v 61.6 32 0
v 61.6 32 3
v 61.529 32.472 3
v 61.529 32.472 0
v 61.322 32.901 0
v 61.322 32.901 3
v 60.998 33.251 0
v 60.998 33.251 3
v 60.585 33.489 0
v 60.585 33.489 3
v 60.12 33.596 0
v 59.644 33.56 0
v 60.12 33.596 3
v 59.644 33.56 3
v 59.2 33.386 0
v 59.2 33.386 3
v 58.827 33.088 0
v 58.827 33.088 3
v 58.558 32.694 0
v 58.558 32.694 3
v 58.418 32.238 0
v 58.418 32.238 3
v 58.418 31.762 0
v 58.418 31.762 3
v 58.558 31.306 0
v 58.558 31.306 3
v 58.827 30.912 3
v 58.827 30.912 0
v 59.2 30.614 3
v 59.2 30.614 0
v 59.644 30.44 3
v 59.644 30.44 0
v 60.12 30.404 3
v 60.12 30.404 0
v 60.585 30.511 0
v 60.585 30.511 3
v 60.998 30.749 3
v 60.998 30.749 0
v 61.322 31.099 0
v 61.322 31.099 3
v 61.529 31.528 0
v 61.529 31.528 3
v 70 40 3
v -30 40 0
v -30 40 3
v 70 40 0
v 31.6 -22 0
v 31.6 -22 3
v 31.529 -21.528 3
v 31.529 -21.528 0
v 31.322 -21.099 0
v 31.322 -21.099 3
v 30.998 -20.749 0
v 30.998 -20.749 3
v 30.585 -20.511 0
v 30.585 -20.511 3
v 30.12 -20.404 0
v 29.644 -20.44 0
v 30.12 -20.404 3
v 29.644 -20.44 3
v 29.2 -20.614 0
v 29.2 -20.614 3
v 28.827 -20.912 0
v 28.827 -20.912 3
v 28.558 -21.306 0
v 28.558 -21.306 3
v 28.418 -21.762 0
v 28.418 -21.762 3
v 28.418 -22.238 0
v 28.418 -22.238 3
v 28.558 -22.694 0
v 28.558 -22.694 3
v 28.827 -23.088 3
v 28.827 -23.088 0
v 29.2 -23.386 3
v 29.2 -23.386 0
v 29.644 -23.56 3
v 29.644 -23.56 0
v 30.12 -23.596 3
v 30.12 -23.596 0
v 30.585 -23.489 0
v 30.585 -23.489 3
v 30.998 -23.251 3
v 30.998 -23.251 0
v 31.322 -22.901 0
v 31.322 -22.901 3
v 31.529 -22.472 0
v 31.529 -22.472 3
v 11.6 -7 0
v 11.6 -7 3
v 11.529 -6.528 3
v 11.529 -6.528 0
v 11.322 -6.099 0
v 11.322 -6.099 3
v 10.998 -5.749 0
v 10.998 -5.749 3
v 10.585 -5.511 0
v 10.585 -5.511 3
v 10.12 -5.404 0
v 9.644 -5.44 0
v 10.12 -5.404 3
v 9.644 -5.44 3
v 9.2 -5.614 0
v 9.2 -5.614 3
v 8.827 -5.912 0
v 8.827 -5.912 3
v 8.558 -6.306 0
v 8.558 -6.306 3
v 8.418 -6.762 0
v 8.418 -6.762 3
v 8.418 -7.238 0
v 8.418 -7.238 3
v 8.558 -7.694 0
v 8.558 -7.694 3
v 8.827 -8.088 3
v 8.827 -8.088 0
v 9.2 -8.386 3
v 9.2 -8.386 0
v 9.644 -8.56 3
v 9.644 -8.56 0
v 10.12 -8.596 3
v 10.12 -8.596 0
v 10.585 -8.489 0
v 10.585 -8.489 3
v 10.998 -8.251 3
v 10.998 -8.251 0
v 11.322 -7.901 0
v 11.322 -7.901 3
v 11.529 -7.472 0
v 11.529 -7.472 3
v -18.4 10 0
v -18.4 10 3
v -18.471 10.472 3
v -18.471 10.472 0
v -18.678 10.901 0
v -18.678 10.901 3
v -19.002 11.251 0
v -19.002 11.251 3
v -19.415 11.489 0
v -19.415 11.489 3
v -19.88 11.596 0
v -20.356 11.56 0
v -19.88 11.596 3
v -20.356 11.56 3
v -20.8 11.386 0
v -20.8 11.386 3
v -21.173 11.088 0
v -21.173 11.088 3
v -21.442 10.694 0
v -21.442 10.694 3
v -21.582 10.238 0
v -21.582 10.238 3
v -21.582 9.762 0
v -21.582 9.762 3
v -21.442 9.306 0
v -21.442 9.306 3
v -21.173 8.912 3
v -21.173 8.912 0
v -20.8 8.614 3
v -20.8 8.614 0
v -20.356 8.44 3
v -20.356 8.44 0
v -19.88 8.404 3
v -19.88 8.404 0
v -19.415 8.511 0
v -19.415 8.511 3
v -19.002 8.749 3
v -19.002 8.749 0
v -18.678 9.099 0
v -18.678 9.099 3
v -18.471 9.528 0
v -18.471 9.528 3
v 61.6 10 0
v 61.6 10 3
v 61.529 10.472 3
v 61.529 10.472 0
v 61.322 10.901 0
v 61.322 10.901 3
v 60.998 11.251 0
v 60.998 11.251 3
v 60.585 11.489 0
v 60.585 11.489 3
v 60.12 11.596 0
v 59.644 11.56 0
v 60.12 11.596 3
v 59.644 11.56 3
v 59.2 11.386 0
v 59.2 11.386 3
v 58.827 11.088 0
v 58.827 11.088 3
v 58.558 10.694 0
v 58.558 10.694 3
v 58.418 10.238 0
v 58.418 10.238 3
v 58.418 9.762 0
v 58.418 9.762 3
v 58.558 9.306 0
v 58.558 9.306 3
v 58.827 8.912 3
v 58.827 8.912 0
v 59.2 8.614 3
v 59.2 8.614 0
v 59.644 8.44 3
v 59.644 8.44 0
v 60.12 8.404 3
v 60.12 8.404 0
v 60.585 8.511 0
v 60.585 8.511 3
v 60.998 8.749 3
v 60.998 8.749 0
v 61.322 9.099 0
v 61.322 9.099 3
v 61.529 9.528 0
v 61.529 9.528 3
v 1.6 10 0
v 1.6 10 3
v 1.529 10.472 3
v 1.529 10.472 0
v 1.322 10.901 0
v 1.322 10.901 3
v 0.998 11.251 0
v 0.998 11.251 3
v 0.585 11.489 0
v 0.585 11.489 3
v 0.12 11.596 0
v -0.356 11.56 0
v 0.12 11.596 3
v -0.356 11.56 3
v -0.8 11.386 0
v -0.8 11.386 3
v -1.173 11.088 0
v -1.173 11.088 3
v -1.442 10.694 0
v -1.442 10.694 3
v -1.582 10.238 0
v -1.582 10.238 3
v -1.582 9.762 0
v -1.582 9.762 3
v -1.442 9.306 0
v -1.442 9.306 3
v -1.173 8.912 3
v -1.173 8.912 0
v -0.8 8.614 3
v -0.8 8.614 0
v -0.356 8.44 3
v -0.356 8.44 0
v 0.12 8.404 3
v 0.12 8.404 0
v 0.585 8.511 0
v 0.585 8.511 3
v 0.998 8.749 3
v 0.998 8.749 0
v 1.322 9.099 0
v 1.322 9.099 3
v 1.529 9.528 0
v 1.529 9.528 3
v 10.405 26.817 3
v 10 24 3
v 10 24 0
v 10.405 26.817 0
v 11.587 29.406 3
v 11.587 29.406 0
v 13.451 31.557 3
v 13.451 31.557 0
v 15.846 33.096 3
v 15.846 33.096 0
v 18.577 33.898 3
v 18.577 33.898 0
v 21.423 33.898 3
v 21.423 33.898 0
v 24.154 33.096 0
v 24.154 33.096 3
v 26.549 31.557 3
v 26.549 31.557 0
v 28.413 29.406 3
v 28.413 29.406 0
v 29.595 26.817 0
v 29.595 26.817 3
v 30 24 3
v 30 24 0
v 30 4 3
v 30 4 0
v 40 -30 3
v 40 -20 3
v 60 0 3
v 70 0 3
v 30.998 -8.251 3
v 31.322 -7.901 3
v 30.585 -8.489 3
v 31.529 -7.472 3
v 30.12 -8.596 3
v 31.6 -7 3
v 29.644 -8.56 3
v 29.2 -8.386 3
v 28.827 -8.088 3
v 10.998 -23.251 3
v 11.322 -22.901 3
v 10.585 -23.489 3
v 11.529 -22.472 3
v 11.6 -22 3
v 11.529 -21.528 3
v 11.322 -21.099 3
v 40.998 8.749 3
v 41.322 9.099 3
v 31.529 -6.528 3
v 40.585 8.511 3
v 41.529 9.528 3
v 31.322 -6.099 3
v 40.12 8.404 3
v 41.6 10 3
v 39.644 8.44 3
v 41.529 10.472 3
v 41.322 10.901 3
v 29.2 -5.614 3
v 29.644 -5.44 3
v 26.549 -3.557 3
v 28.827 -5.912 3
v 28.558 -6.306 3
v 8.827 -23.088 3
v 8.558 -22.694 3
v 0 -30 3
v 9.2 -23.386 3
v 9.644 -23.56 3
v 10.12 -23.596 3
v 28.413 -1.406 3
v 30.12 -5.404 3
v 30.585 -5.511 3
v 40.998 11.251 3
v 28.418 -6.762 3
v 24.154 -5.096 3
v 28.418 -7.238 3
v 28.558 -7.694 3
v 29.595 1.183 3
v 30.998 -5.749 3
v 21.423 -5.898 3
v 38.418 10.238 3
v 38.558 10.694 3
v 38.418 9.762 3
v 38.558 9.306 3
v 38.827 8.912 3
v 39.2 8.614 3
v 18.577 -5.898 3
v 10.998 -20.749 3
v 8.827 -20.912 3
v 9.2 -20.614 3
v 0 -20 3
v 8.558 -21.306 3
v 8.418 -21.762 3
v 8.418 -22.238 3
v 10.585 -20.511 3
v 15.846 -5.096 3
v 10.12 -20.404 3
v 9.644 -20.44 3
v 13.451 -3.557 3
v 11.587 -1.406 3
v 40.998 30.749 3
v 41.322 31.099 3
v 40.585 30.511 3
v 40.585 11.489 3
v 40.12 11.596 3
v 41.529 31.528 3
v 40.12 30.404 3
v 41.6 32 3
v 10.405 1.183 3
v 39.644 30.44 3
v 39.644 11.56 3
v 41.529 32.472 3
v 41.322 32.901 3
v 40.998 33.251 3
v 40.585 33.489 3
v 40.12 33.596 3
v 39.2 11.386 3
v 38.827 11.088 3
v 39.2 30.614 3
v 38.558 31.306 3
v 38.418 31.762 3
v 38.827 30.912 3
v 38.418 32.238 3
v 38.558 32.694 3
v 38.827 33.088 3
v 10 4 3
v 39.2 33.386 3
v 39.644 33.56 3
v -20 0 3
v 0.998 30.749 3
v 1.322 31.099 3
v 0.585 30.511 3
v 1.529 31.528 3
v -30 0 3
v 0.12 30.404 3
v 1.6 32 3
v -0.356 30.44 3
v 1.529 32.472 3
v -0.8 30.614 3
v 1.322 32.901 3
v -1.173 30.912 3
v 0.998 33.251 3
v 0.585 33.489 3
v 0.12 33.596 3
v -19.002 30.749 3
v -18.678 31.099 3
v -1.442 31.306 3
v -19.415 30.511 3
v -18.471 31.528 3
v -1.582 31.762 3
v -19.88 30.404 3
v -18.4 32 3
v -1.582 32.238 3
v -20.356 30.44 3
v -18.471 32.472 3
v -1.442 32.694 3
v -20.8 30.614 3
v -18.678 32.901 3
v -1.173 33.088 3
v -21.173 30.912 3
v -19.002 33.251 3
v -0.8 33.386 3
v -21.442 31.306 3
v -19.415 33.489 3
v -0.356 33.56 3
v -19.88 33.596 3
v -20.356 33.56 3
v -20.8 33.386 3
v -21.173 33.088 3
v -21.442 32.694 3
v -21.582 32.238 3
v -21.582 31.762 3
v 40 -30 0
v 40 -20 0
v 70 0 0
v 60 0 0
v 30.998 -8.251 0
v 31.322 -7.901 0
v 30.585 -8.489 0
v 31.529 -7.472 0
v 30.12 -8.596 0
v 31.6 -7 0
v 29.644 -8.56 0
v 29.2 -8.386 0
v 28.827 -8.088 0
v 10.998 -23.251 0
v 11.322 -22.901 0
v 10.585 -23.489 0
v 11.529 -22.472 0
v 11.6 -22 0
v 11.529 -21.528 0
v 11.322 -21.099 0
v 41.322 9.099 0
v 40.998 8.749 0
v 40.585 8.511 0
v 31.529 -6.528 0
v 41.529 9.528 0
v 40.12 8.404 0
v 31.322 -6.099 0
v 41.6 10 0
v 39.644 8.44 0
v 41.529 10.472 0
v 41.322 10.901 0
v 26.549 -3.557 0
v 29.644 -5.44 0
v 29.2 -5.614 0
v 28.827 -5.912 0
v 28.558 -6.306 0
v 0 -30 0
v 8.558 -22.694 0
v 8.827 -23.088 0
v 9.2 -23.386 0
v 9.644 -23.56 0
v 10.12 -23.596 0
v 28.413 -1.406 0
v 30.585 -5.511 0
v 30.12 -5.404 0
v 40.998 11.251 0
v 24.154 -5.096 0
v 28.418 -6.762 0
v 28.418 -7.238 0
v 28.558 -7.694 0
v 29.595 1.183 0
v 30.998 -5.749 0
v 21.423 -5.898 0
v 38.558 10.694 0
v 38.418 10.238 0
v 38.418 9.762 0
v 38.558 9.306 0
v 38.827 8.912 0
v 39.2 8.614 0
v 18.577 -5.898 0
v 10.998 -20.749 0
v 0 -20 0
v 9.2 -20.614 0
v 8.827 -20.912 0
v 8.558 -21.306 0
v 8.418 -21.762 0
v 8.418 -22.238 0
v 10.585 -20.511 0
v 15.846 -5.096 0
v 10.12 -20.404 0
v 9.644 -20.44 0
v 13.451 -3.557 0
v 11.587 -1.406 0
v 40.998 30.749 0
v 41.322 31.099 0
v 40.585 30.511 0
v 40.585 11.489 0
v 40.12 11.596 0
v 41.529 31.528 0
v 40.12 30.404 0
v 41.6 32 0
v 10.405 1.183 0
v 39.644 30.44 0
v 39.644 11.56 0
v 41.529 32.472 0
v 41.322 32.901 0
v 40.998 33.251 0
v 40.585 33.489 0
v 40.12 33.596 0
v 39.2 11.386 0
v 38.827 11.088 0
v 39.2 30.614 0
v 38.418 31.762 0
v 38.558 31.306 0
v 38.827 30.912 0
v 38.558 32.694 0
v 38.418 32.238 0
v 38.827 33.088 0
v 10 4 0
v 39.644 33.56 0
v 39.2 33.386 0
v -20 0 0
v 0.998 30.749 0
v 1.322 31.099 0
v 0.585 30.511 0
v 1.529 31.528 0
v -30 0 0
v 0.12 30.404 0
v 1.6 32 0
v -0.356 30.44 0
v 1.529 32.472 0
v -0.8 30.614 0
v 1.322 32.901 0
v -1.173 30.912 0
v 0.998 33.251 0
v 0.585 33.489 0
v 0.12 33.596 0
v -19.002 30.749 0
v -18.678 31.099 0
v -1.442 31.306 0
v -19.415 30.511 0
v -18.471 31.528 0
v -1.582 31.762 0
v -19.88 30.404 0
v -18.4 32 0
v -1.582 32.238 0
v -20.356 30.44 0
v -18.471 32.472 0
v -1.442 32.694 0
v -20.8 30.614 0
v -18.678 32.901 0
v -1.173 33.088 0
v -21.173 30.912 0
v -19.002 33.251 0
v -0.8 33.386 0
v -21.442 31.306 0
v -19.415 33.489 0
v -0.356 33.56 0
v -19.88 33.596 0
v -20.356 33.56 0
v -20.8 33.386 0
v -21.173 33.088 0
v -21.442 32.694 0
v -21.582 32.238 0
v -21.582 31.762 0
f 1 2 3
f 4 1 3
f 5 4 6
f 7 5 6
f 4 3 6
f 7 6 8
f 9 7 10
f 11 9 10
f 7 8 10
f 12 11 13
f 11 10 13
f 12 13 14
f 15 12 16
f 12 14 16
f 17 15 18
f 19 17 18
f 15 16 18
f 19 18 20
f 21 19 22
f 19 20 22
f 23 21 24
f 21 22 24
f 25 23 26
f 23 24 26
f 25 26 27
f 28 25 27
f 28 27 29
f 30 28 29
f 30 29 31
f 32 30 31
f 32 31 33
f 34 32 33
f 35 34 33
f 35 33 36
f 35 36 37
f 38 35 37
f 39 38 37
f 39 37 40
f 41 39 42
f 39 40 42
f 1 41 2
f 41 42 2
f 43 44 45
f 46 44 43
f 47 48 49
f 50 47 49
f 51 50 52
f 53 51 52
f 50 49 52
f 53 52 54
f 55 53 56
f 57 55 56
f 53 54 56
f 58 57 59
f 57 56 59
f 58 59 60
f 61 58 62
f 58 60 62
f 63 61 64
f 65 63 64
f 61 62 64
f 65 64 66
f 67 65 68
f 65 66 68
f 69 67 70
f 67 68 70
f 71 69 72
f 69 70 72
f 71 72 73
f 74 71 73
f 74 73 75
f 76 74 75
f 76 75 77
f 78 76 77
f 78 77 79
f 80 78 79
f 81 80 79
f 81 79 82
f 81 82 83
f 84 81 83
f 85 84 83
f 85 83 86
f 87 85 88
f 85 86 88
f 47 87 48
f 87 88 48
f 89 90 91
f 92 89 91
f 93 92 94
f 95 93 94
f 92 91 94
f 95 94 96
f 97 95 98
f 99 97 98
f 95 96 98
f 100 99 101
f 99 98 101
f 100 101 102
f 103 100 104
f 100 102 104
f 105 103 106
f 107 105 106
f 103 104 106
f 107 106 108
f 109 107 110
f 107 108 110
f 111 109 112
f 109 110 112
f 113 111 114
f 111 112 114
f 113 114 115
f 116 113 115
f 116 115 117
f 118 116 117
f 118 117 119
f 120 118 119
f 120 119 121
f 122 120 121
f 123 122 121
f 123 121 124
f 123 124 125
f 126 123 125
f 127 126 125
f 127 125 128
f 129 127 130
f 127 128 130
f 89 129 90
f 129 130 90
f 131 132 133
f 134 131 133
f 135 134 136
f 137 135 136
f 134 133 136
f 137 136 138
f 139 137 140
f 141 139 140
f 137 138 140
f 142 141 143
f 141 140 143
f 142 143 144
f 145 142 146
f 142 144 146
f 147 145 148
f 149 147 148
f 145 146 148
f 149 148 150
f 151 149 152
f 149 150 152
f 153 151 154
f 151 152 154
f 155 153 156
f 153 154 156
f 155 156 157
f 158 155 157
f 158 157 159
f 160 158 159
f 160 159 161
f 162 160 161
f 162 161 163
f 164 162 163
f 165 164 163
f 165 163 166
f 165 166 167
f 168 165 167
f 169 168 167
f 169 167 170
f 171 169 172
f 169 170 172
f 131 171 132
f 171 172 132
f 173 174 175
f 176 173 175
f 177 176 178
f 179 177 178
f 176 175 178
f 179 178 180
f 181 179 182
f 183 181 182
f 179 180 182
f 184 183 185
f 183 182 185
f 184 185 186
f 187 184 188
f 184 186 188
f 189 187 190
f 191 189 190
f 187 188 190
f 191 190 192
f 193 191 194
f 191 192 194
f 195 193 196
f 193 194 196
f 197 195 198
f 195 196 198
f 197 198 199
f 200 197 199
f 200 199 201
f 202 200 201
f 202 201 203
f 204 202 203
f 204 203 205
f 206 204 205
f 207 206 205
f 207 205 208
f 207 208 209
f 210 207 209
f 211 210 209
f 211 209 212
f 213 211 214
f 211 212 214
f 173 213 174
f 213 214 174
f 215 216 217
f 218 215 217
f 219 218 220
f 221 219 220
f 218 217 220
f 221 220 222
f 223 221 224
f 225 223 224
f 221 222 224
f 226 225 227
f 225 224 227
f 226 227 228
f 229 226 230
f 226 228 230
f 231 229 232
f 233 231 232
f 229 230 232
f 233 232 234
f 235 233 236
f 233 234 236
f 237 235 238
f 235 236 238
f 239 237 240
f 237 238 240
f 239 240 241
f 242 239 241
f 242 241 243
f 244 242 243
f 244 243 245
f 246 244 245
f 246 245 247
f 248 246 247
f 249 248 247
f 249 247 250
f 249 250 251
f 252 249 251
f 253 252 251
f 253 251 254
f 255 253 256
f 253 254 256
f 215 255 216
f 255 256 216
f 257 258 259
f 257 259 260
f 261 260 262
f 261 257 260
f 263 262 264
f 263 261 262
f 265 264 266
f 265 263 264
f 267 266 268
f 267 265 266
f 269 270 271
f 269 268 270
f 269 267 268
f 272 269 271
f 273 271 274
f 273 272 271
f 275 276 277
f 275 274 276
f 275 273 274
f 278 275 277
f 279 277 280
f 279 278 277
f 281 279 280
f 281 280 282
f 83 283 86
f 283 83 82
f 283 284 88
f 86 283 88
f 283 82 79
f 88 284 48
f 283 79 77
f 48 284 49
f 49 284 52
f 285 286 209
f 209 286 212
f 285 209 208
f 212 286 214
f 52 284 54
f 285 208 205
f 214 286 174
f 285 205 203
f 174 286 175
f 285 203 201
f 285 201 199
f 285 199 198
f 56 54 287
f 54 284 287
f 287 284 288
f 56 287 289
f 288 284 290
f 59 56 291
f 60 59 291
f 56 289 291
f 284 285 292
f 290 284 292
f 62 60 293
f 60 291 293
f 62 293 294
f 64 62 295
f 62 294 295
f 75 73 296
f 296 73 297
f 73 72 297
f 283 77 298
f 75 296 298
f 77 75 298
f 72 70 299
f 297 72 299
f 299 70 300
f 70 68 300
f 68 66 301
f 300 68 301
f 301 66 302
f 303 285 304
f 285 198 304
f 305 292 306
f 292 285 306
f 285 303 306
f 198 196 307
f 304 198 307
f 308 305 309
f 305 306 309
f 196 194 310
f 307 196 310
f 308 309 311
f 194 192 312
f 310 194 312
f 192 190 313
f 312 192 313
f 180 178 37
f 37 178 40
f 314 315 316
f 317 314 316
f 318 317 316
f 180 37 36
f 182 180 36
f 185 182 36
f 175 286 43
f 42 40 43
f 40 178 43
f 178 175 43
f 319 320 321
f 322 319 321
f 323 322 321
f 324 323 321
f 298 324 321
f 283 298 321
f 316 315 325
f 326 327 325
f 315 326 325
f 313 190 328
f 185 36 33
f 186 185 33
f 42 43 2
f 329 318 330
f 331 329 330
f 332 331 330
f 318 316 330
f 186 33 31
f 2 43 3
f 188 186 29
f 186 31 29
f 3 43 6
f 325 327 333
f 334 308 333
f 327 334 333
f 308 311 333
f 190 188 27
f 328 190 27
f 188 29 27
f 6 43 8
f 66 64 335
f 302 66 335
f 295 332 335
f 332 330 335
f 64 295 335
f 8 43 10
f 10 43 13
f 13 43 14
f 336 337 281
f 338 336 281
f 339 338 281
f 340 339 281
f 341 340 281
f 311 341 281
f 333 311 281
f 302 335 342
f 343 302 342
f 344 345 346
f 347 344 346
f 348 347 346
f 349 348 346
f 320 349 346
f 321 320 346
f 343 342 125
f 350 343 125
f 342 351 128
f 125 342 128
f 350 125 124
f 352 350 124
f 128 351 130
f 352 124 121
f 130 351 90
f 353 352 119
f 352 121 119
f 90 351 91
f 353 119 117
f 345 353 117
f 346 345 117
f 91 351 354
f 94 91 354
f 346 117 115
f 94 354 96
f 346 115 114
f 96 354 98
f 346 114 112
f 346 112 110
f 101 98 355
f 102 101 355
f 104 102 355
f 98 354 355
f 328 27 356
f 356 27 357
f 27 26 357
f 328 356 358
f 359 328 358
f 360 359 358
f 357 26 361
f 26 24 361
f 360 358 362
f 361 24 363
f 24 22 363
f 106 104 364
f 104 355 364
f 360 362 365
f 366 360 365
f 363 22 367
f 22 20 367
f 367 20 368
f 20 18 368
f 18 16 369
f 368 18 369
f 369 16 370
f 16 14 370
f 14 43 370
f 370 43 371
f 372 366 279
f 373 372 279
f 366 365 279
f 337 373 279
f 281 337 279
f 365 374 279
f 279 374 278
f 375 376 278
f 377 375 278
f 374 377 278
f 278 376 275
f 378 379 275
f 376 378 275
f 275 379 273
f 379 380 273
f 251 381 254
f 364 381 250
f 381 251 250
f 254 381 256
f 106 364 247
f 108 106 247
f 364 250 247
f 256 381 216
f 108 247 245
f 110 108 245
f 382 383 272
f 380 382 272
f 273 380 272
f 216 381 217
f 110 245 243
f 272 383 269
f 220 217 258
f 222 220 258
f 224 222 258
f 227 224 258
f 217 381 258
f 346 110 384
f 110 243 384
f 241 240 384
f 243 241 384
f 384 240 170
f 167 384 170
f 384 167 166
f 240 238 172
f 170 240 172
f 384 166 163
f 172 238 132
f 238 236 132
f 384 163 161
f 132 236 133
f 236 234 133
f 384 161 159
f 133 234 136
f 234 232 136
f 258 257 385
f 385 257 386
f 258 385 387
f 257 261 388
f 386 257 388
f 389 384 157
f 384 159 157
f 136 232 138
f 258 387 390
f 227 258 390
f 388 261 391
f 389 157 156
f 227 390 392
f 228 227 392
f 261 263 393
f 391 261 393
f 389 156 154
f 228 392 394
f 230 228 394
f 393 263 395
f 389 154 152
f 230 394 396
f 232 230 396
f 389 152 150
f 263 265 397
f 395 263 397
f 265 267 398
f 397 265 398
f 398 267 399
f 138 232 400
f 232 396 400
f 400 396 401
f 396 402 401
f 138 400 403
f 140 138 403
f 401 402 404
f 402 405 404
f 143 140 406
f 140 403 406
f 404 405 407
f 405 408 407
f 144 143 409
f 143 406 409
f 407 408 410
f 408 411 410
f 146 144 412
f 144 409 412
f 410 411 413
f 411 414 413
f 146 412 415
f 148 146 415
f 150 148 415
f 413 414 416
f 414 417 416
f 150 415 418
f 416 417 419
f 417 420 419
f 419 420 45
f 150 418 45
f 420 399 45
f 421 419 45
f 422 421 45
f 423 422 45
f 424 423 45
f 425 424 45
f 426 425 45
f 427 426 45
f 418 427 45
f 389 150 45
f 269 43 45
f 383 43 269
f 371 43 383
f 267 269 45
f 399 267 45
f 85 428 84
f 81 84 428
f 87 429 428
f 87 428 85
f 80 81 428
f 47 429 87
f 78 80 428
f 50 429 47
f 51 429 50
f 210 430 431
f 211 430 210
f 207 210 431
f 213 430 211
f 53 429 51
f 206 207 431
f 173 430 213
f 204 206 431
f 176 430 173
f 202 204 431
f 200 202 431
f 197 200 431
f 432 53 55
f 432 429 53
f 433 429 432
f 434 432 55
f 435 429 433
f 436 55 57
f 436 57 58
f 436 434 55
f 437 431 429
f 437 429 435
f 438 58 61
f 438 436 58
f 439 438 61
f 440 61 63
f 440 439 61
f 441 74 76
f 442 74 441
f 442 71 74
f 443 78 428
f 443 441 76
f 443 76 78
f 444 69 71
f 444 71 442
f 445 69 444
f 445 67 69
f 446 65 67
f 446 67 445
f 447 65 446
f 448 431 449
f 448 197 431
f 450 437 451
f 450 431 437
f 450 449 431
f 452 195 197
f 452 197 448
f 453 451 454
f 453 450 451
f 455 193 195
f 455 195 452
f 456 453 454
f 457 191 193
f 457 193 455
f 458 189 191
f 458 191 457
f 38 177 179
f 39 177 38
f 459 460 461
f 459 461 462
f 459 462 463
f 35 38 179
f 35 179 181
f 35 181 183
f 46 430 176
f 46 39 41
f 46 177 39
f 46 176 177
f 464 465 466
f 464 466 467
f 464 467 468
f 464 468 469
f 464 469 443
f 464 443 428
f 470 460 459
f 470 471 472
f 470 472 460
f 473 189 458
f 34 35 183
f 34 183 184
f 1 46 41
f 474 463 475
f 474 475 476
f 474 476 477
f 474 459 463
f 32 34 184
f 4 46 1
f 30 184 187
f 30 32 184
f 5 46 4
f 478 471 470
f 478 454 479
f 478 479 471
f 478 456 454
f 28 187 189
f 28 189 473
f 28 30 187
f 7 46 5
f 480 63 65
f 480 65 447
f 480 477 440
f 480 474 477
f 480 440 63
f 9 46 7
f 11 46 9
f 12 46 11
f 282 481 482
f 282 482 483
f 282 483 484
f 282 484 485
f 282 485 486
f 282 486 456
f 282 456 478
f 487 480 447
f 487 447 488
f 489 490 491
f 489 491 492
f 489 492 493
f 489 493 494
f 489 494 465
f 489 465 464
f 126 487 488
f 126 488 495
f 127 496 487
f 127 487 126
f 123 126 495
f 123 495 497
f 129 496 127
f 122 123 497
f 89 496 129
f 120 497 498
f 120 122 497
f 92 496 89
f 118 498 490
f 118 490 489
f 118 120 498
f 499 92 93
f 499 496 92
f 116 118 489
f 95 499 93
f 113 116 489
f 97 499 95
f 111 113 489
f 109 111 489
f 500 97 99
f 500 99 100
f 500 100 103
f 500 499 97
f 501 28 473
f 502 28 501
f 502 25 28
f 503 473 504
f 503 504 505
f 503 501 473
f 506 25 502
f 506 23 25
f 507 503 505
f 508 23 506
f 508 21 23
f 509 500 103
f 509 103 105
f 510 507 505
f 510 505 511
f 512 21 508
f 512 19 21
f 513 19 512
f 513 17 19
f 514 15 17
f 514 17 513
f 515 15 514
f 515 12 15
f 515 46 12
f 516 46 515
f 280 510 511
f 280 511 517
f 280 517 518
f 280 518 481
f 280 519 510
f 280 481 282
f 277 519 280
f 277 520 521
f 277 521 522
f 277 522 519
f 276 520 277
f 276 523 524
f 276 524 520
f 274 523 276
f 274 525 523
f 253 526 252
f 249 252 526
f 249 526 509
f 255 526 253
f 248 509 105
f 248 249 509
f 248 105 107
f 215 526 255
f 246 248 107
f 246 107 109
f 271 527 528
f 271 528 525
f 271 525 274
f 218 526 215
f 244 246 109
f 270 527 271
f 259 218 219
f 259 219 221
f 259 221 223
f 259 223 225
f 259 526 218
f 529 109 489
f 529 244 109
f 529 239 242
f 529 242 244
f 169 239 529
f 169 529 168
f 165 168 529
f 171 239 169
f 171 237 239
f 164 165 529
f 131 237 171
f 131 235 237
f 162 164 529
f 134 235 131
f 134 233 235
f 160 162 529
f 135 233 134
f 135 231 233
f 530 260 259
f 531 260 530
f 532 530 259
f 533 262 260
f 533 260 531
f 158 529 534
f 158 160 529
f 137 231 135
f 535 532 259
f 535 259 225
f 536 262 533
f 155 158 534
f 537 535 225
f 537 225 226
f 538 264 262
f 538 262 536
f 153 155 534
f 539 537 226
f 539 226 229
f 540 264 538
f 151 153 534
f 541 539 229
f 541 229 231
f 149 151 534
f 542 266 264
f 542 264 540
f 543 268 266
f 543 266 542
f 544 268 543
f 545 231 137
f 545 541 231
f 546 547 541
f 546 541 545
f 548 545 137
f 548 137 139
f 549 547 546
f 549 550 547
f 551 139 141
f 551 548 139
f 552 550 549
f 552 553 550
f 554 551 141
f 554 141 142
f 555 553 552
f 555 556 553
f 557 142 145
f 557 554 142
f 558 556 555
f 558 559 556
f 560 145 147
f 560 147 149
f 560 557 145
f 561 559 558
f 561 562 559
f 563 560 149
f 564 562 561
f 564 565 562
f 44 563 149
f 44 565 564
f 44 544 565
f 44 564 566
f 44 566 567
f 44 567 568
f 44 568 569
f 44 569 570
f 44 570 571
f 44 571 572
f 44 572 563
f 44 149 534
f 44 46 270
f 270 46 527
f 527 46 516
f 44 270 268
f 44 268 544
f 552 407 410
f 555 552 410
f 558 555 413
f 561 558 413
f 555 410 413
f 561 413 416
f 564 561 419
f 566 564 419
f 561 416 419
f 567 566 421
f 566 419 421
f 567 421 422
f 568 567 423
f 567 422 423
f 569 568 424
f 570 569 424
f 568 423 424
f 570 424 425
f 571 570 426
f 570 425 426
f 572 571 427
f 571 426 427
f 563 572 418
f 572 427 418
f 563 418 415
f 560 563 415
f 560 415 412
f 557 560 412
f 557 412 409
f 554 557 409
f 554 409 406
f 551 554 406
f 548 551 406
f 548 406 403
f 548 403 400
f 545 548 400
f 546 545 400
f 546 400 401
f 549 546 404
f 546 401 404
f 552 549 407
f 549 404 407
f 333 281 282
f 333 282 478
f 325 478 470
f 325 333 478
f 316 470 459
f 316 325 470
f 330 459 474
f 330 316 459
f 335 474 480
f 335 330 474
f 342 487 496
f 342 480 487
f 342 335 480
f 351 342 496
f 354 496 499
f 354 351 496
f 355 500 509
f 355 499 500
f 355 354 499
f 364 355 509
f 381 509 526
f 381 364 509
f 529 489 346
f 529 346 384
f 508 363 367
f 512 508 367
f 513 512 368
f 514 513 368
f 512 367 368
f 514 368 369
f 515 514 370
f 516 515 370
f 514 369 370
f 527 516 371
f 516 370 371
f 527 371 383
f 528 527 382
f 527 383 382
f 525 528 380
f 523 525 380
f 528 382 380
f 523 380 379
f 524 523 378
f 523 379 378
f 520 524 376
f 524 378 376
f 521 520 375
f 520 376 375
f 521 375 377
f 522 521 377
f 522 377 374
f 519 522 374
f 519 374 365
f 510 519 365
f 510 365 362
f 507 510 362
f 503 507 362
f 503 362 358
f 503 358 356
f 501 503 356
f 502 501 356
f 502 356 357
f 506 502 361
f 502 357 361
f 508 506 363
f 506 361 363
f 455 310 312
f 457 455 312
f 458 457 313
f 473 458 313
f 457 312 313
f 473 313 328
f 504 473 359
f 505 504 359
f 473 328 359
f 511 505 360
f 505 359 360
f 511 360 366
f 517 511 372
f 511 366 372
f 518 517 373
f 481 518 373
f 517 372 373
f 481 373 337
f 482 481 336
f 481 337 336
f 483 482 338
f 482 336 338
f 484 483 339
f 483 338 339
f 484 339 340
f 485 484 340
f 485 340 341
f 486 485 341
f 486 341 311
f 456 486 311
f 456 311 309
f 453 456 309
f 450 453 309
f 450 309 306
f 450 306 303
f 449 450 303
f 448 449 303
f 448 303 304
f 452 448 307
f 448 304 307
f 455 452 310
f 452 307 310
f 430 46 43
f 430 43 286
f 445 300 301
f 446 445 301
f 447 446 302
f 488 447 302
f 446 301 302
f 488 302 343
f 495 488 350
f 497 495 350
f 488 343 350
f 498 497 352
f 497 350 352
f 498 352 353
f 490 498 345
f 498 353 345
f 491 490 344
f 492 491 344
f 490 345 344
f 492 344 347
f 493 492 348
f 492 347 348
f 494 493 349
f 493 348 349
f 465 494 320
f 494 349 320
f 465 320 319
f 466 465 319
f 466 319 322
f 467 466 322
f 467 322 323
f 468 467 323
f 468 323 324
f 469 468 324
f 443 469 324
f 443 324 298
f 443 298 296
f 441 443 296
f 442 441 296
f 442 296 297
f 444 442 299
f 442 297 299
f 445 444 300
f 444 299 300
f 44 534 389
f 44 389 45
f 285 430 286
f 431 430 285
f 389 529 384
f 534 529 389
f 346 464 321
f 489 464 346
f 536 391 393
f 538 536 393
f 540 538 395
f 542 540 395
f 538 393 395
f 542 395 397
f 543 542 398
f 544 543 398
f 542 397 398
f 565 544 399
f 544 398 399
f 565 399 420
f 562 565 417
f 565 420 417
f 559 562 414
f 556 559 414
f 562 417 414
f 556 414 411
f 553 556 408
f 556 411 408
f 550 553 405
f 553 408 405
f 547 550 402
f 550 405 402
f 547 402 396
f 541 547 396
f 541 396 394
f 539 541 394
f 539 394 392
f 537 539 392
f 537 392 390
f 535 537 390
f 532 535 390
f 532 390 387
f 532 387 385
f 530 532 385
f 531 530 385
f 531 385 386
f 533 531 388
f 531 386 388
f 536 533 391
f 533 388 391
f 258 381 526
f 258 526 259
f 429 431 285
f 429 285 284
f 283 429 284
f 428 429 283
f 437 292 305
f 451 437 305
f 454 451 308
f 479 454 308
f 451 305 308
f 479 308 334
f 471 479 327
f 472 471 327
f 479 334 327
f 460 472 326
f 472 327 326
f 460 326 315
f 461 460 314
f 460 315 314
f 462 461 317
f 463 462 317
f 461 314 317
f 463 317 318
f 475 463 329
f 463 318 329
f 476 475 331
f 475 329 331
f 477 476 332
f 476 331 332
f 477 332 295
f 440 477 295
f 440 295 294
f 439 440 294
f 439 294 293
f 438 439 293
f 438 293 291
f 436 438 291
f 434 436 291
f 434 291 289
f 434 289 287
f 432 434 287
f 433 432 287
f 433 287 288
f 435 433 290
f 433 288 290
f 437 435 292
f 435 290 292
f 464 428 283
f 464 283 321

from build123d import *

# Parameters (mm, degrees)
EXTRUDE_1_DEPTH     = 3
SKETCH_2_R          = 1.6
CUT_EXTRUDE_1_DEPTH = 3
CUT_EXTRUDE_2_DEPTH = 81.678373806


with BuildPart() as part:
    # 草图1 → 凸台-拉伸1 (new body)
    with BuildSketch(Plane.XY):
        Polygon((-20, 0), (-30, 0), (-30, 40), (70, 40), (70, 0), (60, 0), (40, -20), (40, -30), (0, -30), (0, -20), align=None)
    extrude(amount=EXTRUDE_1_DEPTH)

    # 草图2 → 切除-拉伸1 (cut)
    with BuildSketch(Plane.XY.offset(3)):
        with Locations((10, -7)):
            Circle(SKETCH_2_R)
        with Locations((30, -7)):
            Circle(SKETCH_2_R)
        with Locations((10, -22)):
            Circle(SKETCH_2_R)
        with Locations((30, -22)):
            Circle(SKETCH_2_R)
        with Locations((-20, 10)):
            Circle(SKETCH_2_R)
        with Locations((-20, 32)):
            Circle(SKETCH_2_R)
        with Locations((0, 10)):
            Circle(SKETCH_2_R)
        with Locations((40, 10)):
            Circle(SKETCH_2_R)
        with Locations((60, 10)):
            Circle(SKETCH_2_R)
        with Locations((60, 32)):
            Circle(SKETCH_2_R)
        with Locations((40, 32)):
            Circle(SKETCH_2_R)
        with Locations((0, 32)):
            Circle(SKETCH_2_R)
    extrude(amount=-CUT_EXTRUDE_1_DEPTH, mode=Mode.SUBTRACT)

    # 草图3 → 切除-拉伸2 (cut, through all)
    with BuildSketch(Plane.XY.offset(3)):
        with BuildLine():
            Line((30, 24), (30, 4))
            ThreePointArc((30, 4), (20, -6), (10, 4))
            Line((10, 4), (10, 24))
            ThreePointArc((10, 24), (20, 34), (30, 24))
        make_face()
    extrude(amount=-CUT_EXTRUDE_2_DEPTH, mode=Mode.SUBTRACT)


solid = part.part
